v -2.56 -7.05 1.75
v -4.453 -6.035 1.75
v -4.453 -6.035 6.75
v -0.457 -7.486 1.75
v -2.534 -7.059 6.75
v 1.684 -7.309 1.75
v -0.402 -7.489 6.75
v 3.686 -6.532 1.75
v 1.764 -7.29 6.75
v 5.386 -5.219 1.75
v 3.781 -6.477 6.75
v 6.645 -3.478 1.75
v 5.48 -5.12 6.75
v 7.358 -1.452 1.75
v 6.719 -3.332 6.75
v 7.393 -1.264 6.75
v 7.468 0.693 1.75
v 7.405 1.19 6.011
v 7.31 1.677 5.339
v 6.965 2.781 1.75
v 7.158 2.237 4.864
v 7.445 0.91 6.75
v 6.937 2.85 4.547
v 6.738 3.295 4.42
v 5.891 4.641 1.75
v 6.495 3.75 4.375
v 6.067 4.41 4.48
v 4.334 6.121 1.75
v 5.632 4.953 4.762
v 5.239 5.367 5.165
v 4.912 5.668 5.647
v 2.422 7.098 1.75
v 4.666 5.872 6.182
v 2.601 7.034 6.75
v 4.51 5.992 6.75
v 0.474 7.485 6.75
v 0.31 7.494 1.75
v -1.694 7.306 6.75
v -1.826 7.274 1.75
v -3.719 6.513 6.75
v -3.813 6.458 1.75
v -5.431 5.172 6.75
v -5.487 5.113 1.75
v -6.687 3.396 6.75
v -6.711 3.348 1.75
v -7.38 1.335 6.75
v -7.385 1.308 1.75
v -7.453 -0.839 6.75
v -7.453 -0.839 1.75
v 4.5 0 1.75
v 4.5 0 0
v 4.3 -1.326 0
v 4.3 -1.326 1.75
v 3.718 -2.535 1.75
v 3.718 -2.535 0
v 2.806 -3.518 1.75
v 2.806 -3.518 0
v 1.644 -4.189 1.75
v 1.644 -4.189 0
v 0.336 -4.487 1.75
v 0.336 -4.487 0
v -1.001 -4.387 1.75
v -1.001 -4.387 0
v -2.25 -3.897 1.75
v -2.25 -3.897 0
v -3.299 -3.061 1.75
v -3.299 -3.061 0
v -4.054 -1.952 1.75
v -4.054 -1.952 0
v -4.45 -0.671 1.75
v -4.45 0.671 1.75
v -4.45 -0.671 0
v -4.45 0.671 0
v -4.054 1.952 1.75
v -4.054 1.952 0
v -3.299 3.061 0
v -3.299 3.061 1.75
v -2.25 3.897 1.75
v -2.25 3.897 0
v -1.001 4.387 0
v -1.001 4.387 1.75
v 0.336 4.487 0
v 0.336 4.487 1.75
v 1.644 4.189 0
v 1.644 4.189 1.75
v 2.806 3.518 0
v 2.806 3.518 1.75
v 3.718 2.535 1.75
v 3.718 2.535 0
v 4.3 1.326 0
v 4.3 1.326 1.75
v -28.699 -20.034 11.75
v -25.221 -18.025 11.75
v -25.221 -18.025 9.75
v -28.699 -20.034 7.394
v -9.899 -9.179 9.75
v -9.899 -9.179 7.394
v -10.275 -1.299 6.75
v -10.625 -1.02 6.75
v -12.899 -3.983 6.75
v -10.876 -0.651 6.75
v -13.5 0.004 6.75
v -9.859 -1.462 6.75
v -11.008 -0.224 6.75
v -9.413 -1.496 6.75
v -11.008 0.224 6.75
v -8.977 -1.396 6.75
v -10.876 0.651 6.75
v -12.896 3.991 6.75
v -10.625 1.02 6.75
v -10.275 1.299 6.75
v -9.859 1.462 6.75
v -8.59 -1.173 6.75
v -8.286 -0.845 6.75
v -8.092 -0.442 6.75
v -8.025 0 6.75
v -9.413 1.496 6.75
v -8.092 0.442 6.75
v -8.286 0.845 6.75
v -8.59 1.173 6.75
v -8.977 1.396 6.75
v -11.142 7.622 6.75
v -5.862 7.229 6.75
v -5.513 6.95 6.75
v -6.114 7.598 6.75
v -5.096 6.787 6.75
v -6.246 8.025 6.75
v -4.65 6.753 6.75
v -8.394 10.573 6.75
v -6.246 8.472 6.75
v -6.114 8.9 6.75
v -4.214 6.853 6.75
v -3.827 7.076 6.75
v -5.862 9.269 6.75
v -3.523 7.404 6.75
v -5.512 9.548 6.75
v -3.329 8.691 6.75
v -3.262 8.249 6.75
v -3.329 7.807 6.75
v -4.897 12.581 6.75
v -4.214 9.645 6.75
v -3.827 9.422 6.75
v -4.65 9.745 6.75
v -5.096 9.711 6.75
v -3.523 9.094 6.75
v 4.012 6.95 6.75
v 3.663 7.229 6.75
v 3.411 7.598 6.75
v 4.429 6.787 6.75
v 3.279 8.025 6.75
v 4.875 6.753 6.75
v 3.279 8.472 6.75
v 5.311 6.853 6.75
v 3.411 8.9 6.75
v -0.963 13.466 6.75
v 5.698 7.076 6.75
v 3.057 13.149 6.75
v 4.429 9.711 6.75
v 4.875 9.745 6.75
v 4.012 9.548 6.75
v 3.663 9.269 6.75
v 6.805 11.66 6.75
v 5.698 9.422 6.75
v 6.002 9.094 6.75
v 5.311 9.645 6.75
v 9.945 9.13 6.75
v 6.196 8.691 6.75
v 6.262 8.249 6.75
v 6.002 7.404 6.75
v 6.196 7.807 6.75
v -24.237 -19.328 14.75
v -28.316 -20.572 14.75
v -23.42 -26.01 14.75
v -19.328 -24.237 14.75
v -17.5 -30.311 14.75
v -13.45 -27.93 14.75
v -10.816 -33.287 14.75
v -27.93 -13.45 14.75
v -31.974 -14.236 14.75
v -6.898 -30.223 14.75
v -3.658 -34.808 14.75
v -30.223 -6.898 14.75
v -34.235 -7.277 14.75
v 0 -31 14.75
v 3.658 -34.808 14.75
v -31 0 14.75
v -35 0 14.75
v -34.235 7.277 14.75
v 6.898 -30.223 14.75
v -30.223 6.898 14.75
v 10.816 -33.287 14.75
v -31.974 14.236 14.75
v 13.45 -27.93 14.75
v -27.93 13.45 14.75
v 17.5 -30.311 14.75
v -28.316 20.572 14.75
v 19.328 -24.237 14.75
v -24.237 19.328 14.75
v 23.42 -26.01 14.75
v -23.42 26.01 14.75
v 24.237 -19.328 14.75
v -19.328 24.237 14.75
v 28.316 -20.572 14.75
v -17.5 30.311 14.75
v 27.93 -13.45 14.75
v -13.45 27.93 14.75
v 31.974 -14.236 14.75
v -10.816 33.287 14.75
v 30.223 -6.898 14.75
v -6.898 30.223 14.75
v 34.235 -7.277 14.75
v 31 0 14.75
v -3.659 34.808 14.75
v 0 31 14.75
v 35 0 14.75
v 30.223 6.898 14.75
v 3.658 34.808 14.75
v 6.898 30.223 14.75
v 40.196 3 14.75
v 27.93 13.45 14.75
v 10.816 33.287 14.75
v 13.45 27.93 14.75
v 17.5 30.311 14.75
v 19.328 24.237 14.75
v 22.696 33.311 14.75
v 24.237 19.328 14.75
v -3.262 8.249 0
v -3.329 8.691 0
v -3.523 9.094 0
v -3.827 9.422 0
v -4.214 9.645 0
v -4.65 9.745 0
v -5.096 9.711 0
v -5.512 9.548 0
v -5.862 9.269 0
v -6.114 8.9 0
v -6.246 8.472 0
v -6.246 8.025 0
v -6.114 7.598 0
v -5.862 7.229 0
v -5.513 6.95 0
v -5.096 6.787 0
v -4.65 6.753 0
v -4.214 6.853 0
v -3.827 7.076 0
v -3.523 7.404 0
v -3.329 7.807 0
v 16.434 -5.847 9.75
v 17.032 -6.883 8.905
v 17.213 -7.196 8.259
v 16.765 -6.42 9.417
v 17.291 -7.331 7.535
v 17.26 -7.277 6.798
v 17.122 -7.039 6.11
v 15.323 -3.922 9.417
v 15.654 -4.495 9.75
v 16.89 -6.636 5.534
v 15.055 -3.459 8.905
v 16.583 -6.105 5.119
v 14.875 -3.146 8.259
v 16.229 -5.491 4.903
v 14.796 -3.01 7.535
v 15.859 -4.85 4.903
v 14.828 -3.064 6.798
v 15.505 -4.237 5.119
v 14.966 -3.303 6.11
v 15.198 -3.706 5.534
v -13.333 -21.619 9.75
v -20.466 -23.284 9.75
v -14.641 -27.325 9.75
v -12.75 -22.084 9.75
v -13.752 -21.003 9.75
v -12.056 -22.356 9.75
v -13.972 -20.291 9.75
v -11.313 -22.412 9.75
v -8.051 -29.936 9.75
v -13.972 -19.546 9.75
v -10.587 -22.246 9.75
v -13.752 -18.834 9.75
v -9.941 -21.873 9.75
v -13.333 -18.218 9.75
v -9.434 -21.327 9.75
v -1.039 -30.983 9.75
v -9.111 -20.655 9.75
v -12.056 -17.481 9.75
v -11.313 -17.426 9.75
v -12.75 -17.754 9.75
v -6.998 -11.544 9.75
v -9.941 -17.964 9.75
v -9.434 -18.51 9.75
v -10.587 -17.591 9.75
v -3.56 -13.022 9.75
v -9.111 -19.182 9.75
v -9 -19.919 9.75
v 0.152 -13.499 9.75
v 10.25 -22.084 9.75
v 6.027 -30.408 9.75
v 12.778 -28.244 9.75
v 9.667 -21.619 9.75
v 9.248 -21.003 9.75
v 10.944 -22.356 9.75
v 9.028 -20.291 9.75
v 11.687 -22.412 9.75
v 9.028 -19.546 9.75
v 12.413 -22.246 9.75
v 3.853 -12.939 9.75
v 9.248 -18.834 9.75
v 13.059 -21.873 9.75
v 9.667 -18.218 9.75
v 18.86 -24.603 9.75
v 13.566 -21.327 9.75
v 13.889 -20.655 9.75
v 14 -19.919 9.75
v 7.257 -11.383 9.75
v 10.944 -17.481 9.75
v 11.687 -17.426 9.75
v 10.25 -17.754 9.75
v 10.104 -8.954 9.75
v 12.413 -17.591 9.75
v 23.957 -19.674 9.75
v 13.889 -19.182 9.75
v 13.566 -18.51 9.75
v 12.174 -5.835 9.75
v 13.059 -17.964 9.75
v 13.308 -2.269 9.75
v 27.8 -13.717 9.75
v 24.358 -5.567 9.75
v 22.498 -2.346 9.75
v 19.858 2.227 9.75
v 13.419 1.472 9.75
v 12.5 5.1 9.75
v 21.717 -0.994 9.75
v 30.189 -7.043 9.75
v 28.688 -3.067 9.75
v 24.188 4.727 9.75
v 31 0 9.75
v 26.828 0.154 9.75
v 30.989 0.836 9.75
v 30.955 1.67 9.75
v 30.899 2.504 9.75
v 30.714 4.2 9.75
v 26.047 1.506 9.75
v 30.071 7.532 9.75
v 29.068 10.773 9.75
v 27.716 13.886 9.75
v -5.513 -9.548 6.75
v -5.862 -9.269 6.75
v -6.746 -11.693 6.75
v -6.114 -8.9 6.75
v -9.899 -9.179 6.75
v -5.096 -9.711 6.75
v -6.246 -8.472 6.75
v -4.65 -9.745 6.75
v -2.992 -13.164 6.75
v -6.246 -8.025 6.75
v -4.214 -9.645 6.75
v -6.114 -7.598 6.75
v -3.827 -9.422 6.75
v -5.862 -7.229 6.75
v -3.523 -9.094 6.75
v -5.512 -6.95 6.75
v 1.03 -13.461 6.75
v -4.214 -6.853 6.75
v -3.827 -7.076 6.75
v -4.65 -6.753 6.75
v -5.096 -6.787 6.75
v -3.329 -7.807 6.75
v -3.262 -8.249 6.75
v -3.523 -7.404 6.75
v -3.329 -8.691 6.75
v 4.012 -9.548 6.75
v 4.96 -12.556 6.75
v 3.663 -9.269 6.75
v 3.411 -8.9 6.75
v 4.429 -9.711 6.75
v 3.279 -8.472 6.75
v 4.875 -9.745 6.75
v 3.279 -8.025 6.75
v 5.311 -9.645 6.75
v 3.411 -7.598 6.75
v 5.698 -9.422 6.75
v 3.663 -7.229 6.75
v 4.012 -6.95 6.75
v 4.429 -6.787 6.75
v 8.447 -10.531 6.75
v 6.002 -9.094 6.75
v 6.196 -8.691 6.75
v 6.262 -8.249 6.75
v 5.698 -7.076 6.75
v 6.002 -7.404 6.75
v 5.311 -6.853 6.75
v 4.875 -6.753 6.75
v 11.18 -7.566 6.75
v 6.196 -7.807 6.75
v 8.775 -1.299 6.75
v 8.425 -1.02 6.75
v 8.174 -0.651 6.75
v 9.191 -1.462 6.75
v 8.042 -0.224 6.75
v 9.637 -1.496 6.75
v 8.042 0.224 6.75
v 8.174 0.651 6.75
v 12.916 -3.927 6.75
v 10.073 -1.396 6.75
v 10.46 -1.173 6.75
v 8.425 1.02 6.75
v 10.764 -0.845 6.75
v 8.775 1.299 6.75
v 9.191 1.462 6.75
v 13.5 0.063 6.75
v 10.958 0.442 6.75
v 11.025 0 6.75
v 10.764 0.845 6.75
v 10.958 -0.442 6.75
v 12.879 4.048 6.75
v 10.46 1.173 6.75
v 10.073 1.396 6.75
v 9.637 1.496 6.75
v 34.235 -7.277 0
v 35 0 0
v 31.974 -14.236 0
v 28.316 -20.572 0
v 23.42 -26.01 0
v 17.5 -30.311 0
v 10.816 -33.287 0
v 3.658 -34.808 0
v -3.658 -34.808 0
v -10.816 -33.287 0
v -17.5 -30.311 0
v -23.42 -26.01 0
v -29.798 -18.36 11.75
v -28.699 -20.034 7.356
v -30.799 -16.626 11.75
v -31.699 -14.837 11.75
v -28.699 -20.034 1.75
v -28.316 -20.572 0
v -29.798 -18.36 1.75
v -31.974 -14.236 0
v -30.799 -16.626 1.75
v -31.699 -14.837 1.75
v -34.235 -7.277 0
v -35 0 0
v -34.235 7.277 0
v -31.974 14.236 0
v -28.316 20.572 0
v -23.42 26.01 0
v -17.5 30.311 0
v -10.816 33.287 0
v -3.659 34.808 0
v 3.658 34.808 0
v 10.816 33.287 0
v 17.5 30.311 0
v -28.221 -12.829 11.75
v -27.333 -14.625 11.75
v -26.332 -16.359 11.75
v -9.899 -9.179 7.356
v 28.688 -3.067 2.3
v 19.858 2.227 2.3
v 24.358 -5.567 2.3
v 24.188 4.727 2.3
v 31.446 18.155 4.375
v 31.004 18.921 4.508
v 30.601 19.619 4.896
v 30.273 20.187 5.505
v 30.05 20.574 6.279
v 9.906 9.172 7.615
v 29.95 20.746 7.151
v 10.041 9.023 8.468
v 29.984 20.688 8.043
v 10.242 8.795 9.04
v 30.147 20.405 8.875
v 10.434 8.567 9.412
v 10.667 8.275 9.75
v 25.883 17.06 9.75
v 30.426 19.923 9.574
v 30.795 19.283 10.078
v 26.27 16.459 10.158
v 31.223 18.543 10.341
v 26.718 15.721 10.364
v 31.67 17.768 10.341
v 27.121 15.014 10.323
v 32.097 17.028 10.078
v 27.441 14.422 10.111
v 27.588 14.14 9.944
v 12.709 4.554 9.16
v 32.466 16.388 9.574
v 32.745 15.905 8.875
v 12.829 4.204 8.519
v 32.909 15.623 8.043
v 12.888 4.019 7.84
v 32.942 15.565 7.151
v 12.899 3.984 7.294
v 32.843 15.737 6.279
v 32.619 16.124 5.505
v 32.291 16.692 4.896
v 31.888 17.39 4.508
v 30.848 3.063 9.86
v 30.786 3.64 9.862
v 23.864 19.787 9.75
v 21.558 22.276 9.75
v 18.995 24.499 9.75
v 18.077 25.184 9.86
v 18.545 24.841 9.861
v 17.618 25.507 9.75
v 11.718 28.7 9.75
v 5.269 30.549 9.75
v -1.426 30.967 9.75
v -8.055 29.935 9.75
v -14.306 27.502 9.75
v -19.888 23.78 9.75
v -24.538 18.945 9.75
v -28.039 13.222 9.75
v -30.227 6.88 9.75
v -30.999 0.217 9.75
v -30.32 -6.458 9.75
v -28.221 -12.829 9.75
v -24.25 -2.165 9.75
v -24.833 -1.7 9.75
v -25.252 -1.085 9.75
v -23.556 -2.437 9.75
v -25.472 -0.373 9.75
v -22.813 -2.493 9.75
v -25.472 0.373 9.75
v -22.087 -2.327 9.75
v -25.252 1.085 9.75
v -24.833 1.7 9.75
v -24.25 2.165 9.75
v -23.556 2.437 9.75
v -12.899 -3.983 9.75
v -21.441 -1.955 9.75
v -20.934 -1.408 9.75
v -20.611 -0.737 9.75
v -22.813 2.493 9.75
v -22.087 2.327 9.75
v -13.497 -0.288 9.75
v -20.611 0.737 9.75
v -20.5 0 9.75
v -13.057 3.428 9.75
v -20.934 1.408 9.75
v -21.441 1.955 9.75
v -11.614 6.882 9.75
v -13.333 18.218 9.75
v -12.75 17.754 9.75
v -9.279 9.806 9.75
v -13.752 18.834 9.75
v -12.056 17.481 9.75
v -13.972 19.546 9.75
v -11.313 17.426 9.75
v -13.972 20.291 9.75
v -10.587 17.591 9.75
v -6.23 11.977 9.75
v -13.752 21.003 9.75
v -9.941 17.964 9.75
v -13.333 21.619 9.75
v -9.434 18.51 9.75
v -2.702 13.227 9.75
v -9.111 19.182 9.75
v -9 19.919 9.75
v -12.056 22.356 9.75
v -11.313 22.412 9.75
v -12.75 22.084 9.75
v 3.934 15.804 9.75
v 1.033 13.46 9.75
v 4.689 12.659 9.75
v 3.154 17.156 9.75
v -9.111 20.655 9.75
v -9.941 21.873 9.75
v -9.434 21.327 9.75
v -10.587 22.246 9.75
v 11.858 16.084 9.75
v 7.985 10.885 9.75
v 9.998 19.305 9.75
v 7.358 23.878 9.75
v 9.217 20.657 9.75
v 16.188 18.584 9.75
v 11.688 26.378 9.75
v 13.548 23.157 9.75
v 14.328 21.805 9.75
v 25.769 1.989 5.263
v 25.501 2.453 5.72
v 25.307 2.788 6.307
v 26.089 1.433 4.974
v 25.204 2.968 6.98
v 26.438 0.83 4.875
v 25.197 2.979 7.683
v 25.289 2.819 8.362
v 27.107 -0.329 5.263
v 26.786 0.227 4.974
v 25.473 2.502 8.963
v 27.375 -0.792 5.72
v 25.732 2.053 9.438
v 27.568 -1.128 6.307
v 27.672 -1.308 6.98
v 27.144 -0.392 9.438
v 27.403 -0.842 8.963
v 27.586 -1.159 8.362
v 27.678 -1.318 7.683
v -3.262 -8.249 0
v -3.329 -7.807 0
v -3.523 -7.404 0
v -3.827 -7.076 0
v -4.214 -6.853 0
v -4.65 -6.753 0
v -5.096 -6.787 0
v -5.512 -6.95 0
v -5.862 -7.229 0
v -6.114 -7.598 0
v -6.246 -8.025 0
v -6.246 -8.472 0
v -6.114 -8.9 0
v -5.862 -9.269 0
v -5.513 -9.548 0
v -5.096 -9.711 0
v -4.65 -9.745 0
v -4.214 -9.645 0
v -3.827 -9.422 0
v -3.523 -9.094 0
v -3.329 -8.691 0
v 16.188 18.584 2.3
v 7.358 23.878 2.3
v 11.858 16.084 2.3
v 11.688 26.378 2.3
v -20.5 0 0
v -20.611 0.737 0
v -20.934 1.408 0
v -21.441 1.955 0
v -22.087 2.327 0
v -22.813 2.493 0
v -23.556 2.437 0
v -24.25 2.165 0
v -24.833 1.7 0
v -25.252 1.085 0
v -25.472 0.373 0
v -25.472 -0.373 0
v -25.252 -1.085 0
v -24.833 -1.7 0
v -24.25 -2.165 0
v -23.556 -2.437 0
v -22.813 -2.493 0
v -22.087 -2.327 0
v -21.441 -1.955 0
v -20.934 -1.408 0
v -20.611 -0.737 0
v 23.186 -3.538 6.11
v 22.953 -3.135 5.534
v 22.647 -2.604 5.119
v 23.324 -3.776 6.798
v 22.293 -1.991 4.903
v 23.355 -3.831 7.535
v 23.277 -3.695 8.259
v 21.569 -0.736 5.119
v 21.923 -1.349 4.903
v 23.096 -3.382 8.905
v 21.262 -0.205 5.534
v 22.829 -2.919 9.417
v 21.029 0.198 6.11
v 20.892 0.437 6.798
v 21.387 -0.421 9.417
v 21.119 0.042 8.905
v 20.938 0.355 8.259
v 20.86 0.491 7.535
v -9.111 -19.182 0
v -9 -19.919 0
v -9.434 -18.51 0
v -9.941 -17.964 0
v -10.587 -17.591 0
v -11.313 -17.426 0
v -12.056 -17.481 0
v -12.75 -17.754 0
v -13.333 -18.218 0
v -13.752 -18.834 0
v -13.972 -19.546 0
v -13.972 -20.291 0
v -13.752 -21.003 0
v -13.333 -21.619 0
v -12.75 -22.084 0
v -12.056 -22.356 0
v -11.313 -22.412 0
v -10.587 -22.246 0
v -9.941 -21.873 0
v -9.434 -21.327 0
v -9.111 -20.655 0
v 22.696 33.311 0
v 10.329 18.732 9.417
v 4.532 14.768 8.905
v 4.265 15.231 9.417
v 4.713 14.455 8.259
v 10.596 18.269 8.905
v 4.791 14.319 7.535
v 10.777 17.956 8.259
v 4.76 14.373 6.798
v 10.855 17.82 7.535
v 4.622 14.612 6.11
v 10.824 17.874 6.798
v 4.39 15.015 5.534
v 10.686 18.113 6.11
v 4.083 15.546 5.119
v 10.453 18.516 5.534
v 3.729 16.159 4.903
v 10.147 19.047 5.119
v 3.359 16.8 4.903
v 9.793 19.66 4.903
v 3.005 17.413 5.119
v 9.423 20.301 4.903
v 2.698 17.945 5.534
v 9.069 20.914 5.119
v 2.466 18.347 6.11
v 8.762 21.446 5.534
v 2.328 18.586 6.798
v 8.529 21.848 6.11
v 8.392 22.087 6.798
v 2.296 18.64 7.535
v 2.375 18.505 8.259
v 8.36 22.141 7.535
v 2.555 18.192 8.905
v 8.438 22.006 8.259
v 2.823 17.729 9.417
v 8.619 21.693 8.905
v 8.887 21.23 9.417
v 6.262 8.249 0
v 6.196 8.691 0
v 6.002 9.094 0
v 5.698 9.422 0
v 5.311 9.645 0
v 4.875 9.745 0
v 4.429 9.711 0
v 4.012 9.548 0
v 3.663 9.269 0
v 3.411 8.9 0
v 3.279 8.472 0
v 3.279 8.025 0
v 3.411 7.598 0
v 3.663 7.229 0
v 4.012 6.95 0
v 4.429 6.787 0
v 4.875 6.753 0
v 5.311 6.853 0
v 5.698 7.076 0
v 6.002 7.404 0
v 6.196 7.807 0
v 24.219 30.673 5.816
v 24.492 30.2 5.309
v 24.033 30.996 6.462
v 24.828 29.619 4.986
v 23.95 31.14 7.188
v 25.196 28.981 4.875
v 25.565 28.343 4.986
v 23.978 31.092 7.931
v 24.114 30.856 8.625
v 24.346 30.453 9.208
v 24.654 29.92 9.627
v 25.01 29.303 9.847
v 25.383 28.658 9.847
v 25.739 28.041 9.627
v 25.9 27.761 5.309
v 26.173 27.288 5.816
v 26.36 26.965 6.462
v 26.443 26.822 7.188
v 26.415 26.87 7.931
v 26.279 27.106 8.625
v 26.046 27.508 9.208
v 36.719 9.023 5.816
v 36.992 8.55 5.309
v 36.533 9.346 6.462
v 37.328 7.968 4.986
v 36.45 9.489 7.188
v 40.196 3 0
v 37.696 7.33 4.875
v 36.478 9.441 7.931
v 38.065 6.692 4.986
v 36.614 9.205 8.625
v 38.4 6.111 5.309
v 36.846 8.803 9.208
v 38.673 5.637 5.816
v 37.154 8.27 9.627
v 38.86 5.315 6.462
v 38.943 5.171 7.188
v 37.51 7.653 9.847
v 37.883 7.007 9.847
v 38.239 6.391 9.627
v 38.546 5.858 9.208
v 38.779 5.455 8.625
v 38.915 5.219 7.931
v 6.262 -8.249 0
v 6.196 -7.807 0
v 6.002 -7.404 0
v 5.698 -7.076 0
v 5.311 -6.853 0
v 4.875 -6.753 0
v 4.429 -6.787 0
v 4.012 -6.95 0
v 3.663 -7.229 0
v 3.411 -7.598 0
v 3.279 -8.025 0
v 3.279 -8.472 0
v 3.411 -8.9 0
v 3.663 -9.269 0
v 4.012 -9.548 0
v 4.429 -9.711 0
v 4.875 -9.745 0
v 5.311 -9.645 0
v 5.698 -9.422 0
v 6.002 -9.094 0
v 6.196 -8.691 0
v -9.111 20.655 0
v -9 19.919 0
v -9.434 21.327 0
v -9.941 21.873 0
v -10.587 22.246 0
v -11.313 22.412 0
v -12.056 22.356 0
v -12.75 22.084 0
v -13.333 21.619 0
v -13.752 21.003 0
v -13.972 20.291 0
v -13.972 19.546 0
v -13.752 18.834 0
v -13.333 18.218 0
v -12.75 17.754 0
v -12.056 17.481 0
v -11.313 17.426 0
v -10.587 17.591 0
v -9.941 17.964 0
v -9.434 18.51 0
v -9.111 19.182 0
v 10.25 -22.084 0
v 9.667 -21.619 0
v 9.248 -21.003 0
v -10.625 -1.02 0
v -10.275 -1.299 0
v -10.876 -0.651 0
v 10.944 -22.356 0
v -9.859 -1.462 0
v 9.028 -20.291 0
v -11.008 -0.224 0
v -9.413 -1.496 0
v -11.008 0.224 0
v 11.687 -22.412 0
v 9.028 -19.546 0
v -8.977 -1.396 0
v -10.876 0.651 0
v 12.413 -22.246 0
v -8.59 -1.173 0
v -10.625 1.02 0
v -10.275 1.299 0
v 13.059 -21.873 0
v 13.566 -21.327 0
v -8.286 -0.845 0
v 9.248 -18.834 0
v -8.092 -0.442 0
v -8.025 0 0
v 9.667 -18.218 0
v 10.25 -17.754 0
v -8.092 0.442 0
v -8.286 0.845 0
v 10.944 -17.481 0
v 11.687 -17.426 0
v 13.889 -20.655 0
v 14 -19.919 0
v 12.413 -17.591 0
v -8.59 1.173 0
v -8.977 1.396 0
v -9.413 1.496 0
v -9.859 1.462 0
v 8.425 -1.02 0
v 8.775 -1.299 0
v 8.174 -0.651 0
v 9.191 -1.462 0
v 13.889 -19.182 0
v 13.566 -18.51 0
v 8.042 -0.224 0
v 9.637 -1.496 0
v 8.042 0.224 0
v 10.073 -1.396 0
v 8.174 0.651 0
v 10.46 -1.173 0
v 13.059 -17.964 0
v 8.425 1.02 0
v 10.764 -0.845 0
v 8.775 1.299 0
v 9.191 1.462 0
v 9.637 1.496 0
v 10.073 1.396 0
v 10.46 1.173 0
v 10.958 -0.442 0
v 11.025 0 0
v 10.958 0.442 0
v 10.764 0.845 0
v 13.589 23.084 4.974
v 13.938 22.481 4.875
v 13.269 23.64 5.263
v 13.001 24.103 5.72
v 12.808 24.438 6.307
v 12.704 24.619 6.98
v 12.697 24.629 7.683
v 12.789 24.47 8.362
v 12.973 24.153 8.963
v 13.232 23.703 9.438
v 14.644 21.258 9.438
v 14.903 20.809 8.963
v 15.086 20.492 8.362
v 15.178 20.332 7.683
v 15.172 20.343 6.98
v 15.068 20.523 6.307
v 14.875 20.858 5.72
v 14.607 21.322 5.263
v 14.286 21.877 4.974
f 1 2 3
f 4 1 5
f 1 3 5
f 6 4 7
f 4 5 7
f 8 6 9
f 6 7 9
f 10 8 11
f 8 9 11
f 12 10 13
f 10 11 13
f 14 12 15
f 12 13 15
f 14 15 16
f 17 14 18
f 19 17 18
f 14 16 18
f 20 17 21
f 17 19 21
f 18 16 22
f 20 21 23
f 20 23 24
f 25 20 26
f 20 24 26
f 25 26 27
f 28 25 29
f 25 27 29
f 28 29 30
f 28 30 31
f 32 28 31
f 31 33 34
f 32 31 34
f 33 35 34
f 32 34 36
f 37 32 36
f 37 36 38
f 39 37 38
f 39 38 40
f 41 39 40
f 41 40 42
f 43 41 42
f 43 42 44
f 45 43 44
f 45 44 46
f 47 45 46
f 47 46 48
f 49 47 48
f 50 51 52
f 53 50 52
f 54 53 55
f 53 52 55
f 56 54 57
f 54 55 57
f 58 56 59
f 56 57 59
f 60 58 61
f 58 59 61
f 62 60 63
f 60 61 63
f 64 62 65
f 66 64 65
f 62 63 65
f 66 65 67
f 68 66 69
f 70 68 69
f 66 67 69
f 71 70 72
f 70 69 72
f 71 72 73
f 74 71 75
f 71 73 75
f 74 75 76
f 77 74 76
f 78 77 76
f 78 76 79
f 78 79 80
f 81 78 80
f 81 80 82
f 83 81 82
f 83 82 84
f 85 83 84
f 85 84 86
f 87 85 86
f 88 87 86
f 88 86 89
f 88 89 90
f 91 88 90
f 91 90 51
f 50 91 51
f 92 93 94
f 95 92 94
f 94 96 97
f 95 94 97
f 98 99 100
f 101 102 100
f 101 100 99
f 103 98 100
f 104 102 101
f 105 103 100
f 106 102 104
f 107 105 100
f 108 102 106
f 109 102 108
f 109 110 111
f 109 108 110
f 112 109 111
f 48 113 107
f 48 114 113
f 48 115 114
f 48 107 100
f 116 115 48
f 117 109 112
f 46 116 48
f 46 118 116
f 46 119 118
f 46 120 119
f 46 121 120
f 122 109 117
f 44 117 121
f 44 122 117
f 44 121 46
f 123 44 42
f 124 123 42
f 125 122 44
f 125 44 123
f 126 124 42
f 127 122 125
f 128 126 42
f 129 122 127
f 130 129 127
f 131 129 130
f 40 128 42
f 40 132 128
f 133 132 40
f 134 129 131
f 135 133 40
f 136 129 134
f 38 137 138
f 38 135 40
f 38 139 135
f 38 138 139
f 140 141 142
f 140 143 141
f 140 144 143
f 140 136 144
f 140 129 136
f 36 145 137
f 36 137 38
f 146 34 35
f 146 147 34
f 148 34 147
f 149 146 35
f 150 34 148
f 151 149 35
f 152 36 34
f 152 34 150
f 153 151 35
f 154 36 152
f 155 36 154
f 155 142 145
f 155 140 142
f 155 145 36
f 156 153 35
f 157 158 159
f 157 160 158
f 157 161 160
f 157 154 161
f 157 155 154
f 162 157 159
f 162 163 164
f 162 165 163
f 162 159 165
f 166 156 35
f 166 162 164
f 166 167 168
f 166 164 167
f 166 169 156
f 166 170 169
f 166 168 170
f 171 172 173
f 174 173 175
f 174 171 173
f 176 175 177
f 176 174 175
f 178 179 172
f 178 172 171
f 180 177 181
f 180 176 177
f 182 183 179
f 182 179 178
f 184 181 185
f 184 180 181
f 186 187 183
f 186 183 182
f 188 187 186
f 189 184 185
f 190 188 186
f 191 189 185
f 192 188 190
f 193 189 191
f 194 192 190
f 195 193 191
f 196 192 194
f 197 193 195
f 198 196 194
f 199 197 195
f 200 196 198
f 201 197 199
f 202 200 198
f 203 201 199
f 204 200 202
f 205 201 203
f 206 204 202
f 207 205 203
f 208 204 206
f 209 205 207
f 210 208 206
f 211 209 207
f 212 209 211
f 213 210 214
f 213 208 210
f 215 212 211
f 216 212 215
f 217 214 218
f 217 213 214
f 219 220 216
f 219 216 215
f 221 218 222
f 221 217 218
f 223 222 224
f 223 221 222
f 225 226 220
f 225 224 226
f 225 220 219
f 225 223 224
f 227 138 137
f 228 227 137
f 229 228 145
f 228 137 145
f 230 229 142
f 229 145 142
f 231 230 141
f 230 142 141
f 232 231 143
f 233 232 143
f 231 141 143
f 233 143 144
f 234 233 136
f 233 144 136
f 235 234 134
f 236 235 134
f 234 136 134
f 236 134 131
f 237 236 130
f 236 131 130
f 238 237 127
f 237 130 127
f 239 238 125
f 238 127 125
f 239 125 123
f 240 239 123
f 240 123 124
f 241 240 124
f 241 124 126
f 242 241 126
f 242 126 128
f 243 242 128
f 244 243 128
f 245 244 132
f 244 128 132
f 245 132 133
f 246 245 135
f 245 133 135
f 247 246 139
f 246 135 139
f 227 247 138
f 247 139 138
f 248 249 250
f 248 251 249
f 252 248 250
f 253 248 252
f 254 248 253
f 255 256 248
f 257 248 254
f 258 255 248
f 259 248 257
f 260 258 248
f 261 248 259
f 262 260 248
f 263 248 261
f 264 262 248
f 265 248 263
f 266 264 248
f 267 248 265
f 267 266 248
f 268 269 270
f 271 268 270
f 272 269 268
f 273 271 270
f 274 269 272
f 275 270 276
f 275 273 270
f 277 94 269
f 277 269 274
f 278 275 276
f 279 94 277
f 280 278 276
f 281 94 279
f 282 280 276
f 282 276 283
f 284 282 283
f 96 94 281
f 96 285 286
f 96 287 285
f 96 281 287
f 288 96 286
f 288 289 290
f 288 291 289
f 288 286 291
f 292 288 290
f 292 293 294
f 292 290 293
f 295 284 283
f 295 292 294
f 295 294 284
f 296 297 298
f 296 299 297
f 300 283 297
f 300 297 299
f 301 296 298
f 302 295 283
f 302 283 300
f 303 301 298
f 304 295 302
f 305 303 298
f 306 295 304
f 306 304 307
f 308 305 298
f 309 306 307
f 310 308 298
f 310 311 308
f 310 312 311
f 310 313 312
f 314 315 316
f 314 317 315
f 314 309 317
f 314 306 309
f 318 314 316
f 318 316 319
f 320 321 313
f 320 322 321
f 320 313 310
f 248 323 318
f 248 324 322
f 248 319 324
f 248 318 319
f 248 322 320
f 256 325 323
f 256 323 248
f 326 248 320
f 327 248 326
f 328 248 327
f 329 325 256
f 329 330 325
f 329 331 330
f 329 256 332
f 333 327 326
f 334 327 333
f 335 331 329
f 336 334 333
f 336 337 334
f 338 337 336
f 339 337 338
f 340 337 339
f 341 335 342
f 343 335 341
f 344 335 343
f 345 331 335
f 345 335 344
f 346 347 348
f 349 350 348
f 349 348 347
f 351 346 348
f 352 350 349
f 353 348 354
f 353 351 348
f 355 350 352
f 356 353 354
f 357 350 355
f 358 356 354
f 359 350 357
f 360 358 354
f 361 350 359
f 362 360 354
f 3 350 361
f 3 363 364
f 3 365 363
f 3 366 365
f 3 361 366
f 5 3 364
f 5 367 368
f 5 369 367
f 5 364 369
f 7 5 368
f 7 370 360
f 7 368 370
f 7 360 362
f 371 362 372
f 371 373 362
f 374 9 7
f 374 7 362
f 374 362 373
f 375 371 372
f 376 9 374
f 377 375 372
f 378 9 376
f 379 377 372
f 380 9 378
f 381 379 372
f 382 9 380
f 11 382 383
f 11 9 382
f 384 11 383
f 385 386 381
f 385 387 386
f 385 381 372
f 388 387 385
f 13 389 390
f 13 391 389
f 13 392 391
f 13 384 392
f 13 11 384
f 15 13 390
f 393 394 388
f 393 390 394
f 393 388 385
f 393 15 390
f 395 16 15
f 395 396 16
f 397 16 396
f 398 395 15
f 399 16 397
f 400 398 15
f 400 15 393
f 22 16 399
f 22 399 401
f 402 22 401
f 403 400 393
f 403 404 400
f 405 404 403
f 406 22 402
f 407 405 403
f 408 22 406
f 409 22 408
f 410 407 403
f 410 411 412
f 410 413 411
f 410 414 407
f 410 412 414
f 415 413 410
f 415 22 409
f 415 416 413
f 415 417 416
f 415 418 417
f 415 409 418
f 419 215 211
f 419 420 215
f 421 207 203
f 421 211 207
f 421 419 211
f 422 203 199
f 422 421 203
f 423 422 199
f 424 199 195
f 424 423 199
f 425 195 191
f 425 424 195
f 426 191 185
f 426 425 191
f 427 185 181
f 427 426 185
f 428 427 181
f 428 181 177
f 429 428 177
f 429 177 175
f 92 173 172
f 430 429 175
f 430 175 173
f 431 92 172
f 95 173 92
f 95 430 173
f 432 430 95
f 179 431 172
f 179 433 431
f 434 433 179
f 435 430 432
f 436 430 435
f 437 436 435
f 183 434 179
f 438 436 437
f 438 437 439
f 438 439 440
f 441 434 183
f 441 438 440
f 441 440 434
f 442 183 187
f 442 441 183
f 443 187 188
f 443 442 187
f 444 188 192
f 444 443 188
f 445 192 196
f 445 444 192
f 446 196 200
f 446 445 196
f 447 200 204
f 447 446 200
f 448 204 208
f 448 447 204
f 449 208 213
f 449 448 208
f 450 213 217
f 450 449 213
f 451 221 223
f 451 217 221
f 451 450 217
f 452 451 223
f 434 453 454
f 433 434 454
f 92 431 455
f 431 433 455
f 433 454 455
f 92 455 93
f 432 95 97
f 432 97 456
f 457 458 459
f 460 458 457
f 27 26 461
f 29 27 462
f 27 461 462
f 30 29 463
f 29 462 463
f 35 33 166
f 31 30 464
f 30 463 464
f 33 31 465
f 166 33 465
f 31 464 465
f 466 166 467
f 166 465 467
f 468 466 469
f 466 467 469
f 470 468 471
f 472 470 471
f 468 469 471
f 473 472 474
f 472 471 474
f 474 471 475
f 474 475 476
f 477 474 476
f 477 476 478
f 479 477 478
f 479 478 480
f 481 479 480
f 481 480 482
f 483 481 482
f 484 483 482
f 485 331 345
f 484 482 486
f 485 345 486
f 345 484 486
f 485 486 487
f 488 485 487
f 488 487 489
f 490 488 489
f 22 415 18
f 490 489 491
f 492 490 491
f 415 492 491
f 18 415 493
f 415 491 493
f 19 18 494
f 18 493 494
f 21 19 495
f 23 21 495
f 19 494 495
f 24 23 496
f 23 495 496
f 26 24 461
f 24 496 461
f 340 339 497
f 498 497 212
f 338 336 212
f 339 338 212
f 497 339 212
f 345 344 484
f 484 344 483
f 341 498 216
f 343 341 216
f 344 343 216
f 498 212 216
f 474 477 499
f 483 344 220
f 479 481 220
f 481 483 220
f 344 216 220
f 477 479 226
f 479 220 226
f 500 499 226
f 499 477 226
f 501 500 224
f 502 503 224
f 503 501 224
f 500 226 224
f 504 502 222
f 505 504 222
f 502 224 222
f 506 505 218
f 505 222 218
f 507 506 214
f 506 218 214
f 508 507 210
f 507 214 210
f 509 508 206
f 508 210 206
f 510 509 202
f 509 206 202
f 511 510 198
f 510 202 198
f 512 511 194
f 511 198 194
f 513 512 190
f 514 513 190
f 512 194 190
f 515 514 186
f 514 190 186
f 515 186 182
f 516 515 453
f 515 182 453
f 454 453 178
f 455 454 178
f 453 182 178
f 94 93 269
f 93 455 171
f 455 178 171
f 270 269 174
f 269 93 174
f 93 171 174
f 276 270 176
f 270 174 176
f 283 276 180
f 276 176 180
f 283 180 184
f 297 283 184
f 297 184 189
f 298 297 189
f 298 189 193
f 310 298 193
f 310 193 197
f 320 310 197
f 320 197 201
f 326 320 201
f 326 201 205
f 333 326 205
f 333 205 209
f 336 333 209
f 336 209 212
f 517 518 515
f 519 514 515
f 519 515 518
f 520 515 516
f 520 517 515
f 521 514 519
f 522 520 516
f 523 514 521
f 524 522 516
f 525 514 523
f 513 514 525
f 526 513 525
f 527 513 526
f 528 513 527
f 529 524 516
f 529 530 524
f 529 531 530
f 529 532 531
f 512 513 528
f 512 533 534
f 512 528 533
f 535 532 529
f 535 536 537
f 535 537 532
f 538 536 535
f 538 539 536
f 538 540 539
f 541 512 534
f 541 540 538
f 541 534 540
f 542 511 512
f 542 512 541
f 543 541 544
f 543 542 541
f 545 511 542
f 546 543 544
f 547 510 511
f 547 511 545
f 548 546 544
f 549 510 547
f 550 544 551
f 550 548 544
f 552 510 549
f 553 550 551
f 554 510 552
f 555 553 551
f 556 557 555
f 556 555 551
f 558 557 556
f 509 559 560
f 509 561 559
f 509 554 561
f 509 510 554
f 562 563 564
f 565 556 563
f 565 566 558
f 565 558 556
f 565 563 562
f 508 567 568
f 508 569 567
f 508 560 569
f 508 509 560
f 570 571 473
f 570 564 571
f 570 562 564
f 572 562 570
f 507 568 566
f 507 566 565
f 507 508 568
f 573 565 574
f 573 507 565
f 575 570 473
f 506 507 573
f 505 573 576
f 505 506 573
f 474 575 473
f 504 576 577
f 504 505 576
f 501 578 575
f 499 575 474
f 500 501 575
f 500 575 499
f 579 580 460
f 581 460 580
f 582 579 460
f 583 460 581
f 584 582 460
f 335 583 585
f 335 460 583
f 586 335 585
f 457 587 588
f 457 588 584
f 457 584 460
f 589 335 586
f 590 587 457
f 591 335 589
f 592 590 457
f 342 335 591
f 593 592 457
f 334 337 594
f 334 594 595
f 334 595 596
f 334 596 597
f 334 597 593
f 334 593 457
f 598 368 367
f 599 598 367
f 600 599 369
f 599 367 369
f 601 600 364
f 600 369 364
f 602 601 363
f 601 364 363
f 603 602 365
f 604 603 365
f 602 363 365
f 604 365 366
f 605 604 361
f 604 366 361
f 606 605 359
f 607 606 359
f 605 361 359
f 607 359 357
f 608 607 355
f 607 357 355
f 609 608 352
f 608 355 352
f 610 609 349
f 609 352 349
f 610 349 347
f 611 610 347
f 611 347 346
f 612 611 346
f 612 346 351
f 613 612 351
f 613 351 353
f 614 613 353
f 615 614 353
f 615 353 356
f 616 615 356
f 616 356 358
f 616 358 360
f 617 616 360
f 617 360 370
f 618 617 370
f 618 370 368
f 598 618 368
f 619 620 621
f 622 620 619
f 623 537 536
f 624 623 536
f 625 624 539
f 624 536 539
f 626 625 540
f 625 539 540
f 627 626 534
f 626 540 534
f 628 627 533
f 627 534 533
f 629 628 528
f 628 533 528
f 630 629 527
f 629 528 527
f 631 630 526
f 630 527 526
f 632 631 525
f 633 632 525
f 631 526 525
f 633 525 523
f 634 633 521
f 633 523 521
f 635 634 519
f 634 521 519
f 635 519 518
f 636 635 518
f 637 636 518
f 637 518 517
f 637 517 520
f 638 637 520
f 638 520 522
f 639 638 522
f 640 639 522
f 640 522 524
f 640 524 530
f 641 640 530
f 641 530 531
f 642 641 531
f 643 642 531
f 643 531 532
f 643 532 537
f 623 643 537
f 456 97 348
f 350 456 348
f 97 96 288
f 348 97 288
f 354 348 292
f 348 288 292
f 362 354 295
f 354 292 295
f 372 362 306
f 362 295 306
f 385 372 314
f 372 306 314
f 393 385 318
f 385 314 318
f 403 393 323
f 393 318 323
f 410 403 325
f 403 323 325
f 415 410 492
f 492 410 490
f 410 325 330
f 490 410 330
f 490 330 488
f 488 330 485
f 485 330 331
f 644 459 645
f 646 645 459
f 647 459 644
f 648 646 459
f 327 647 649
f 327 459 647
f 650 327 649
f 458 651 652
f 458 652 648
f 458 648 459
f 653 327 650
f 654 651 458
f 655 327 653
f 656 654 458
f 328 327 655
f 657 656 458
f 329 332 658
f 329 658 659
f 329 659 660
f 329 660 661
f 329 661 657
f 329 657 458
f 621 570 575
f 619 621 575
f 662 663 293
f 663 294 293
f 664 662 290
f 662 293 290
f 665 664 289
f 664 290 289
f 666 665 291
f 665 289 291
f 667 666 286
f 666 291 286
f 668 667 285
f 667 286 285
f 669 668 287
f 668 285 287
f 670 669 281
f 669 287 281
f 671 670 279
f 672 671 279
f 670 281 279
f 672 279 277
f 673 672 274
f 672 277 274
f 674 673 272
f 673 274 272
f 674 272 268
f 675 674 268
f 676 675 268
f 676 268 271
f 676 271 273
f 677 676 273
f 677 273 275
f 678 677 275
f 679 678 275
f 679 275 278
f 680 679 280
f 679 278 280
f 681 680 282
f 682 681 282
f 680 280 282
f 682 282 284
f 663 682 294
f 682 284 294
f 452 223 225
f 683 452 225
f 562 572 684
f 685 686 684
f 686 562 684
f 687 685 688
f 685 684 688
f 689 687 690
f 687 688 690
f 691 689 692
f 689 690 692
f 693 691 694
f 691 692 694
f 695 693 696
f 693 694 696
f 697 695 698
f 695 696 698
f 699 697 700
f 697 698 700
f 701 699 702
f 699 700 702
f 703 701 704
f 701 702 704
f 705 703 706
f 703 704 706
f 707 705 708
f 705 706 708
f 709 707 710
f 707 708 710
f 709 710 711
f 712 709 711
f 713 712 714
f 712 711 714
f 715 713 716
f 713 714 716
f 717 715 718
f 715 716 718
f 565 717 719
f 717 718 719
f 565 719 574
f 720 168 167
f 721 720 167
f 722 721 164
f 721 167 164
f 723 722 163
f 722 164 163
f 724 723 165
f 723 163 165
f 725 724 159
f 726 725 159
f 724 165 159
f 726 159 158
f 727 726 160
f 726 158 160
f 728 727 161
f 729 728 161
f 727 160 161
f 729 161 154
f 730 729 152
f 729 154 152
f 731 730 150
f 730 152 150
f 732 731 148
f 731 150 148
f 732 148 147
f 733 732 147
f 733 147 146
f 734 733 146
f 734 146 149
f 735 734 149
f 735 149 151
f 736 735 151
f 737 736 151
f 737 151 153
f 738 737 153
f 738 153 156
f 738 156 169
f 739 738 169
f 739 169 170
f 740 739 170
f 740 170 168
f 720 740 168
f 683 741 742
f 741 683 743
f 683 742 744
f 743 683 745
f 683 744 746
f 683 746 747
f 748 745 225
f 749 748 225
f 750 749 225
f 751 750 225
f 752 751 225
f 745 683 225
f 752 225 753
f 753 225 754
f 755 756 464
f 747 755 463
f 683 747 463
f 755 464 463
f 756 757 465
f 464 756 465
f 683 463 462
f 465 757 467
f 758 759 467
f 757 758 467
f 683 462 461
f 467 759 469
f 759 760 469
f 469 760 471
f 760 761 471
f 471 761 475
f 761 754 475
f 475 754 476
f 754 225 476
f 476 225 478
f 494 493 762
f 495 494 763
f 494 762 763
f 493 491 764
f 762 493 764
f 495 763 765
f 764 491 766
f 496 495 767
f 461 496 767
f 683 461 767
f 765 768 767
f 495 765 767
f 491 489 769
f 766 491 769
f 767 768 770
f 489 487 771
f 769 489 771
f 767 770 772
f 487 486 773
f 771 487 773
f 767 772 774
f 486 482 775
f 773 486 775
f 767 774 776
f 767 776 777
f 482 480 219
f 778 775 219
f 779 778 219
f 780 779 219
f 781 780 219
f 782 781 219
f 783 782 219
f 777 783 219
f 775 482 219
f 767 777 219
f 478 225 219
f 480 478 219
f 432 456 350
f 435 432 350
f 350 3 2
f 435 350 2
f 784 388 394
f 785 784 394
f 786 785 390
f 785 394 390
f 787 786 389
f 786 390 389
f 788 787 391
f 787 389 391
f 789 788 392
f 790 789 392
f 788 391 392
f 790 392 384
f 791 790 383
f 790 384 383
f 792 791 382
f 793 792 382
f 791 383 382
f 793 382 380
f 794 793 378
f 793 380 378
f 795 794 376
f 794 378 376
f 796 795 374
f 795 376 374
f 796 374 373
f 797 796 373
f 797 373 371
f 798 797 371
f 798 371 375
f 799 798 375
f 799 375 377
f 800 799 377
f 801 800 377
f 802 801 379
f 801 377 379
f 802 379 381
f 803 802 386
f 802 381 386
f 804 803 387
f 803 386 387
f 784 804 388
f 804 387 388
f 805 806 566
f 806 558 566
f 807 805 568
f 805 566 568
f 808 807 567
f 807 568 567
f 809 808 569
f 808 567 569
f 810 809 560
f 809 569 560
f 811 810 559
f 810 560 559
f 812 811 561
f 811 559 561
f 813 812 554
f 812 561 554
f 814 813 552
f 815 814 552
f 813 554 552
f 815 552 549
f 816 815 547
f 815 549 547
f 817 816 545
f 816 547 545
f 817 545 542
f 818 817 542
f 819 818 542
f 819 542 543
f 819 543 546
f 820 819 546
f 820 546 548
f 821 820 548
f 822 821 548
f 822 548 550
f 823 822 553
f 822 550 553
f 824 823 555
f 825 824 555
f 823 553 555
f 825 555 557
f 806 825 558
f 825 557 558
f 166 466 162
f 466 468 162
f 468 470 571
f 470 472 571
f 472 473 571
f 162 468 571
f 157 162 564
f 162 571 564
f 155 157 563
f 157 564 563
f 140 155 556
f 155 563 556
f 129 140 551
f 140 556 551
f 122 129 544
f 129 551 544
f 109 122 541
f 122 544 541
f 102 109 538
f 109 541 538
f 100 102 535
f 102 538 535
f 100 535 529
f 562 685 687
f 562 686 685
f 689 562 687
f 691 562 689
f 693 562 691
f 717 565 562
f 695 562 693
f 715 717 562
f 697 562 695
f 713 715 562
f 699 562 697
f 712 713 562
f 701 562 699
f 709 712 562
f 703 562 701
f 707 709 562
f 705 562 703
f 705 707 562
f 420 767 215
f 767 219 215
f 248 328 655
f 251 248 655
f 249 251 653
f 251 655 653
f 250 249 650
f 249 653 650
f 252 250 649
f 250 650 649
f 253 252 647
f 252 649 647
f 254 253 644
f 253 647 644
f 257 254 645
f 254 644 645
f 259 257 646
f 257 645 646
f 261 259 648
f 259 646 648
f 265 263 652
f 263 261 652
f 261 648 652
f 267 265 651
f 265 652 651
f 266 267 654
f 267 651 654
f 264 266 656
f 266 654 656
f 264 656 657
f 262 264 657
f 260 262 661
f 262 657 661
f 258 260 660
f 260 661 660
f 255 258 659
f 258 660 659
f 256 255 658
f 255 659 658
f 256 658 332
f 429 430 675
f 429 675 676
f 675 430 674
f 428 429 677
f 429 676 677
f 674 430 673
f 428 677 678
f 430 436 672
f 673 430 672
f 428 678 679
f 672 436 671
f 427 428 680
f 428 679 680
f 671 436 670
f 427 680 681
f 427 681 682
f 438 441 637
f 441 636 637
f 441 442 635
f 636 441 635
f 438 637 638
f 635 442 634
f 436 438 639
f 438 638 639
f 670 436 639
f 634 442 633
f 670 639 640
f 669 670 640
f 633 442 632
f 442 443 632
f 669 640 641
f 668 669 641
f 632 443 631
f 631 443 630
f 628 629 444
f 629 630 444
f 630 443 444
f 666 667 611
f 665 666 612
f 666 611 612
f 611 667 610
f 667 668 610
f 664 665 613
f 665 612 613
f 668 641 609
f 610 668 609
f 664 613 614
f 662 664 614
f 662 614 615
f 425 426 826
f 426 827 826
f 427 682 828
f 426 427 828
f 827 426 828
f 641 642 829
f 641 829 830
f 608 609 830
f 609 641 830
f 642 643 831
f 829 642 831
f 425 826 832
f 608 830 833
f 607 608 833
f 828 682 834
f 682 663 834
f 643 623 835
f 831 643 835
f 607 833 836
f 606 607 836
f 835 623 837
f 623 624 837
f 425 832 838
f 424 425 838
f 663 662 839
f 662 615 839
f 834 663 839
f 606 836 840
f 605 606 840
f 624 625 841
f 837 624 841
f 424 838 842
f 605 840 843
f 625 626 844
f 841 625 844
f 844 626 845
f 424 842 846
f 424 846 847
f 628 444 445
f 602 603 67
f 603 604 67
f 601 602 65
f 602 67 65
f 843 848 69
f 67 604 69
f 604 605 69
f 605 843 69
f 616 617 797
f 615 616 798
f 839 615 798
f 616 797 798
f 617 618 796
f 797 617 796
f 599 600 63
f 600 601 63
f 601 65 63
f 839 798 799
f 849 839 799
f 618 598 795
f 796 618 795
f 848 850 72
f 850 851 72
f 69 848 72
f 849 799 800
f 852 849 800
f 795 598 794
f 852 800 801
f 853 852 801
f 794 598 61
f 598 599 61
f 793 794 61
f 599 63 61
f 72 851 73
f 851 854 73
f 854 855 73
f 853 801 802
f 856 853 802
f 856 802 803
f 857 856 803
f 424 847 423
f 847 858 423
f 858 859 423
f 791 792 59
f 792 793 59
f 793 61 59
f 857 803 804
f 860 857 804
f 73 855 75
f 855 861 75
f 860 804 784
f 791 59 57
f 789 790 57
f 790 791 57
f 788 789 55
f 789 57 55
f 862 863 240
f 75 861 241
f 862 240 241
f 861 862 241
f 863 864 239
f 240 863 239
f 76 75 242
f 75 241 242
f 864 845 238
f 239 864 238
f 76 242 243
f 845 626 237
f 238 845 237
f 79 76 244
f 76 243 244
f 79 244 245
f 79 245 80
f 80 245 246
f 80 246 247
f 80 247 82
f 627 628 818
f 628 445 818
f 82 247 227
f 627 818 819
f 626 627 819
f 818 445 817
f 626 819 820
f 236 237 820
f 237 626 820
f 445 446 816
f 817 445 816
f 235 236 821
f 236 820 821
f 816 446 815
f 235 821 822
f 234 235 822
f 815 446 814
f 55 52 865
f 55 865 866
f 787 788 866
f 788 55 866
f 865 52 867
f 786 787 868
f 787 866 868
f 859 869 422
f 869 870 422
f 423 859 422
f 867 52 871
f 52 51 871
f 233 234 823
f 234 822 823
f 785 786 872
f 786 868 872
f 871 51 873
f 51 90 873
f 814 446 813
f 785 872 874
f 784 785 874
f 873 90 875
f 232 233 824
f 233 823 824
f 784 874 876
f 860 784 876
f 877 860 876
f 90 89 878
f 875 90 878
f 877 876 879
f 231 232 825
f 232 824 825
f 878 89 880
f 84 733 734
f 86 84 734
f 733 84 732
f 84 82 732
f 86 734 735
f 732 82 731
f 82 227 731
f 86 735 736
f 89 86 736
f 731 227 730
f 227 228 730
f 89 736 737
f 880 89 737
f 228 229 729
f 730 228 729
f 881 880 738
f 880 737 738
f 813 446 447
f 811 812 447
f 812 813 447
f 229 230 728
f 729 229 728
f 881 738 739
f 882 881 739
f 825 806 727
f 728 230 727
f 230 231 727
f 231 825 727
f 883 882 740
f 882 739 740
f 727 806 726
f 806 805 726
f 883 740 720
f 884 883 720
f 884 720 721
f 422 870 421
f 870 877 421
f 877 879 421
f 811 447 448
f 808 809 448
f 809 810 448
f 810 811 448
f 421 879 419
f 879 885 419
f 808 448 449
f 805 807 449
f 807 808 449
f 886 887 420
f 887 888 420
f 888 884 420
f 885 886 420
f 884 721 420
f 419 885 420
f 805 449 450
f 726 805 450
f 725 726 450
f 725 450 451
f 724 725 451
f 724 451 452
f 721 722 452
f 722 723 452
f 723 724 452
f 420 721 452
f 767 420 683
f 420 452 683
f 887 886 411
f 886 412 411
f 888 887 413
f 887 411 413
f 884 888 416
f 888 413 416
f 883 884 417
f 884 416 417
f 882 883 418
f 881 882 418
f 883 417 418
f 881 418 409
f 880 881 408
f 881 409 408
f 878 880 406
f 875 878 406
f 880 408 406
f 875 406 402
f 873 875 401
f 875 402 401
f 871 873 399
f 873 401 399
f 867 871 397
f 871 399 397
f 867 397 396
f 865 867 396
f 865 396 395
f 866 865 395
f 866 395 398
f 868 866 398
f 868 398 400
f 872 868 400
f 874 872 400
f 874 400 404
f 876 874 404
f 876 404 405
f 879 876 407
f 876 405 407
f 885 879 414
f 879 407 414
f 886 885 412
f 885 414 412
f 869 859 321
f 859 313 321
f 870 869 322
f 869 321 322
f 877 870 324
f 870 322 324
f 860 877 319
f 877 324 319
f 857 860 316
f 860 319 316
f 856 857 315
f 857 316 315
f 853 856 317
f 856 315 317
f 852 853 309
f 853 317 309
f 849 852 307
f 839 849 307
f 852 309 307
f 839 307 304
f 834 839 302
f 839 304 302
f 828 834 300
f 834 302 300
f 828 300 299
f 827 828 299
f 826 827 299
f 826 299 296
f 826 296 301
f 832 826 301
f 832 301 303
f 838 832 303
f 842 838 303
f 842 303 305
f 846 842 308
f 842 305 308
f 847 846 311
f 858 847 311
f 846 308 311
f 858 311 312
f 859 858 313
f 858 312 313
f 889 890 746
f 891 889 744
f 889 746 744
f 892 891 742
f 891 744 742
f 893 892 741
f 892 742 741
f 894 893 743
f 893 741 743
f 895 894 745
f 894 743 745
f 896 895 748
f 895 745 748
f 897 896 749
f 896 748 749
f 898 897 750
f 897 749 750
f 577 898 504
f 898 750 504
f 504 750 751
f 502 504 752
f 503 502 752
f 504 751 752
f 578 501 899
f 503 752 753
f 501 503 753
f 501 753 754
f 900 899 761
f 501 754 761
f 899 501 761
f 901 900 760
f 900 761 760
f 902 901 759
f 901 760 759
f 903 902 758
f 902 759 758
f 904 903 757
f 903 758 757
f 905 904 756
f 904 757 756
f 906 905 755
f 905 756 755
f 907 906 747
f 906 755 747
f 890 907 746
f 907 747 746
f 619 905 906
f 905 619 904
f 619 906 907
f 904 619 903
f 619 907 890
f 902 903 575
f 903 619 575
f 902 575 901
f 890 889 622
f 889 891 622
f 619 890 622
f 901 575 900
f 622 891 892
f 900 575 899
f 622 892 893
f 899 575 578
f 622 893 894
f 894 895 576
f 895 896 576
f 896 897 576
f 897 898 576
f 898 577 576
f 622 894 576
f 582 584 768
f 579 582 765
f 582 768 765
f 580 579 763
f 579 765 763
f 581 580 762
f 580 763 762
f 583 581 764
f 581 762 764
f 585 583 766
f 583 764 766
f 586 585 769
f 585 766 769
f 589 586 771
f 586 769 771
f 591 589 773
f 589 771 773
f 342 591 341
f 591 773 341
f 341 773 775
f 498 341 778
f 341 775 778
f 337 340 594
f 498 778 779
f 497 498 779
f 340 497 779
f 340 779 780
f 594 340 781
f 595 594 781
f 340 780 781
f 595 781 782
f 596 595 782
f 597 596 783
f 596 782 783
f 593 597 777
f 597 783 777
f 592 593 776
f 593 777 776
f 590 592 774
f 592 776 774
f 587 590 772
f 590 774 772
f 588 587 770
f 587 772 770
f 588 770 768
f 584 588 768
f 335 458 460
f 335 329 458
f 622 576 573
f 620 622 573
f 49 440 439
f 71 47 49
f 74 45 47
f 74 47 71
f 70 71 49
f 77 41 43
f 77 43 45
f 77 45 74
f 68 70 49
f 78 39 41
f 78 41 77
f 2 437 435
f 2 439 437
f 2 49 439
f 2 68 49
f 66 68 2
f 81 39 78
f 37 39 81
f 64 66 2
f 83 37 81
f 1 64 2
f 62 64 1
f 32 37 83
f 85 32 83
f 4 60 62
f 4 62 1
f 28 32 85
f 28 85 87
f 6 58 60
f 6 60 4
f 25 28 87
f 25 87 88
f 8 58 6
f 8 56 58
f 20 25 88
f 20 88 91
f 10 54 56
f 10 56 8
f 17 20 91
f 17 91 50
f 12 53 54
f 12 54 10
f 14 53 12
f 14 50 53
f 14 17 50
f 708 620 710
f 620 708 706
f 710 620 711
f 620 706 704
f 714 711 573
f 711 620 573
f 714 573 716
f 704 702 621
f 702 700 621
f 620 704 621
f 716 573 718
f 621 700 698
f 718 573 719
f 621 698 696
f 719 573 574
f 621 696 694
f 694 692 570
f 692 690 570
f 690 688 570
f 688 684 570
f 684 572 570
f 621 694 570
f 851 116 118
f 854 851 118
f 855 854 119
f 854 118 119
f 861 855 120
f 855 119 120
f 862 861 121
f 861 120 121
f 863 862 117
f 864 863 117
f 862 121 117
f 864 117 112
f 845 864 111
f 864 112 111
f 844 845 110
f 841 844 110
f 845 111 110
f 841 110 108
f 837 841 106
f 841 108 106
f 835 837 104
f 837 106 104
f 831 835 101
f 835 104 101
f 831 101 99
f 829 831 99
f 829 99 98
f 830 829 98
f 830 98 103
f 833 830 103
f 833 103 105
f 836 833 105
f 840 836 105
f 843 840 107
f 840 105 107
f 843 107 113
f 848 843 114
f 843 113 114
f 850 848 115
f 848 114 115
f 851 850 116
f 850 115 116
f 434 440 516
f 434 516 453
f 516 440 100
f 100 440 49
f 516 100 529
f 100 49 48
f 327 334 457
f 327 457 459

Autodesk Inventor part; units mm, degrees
ref_plane "YZ Plane" through (0, 0, 0) normal (1, 0, 0) x (0, 1, 0)
ref_plane "XZ Plane" through (0, 0, 0) normal (0, 1, 0) x (-1, 0, 0)
sketch "Sketch1" plane through (0, 0, 0) normal (0, 0, 1) x (1, 0, 0)
  circle A0 centre (0, 0) radius 35
  circle A1 centre (0, 0) radius 4.5
  dimension "d0" = 70
  dimension "d1" = 9
extrude "Extrusion1" add sketch "Sketch1" along normal blind 14.75
sketch "Sketch2" plane through (0, 0, 14.75) normal (0, 0, 1) x (1, 0, 0)
  circle A0 centre (0, 0) radius 13.5
  dimension "d4" = 27
extrude "Extrusion2" cut sketch "Sketch2" against normal blind 8
sketch "Sketch3" plane through (0, 0, 6.75) normal (0, 0, 1) x (1, 0, 0)
  circle A0 centre (0, 0) radius 7.5
  dimension "d7" = 15
extrude "Extrusion3" cut sketch "Sketch3" against normal blind 5
sketch "Sketch4" plane through (0, 0, 6.75) normal (0, 0, 1) x (1, 0, 0)
  circle A0 centre (9.525, 0) radius 1.5
  circle A1 centre (4.7625, 8.2489) radius 1.5
  circle A2 centre (-4.7625, 8.2489) radius 1.5
  circle A3 centre (-9.525, 0) radius 1.5
  circle A4 centre (-4.7625, -8.2489) radius 1.5
  circle A5 centre (4.7625, -8.2489) radius 1.5
  point P0 (0, 0)
  dimension "d10" = 3
  dimension "d11" = 9.525
  dimension "d14" = 360
extrude "Extrusion4" cut sketch "Sketch4" against normal through all
sketch "Sketch5" plane through (0, 0, 14.75) normal (0, 0, 1) x (1, 0, 0)
  circle A0 centre (23, 0) radius 2.5
  circle A1 centre (11.5, 19.9186) radius 2.5
  circle A2 centre (-11.5, 19.9186) radius 2.5
  circle A3 centre (-23, 0) radius 2.5
  circle A4 centre (-11.5, -19.9186) radius 2.5
  circle A5 centre (11.5, -19.9186) radius 2.5
  point P0 (0, 0)
  dimension "d18" = 5
  dimension "d19" = 23
  dimension "d22" = 360
extrude "Extrusion5" cut sketch "Sketch5" against normal through all contours A2 | A3 | A4 | A5
sketch "Sketch7" plane through (0, 0, 14.75) normal (0, 0, 1) x (1, 0, 0)
  line L0 (17.5, 30.3109) -> (22.6962, 33.3109)
  line L1 (22.6962, 33.3109) -> (40.1962, 3)
  line L2 (40.1962, 3) -> (35, 0)
  line L3 (35, 0) -> (17.5, 30.3109)
  circle A0 centre (0, 0) radius 35 construction
  line L4 (0, 0) -> (26.25, 15.1554)
  line L5 (0, 0) -> (26.25, 0)
  dimension "d33" = 6
  dimension "d34" = 35
  dimension "d43" = 30
extrude "Extrusion7" add sketch "Sketch7" against normal blind 14.75
sketch "Sketch8" plane through (40.1962, 3, 14.75) normal (0.866, 0.5, 0) x (0, 0, -1)
  circle A0 centre (7.375, 30) radius 2.5
  circle A1 centre (7.375, 5) radius 2.5
  line L0 (7.375, 30) -> (7.375, 5) construction
  line L1 (14.75, 35) -> (14.75, 0) projected
  line L2 (0, 35) -> (14.75, 35) projected
  point P0 (14.75, 17.5)
  point P1 (14.75, 17.5)
  point P2 (7.375, 17.5)
  point P3 (7.375, 35)
  dimension "d37" = 5
  dimension "d38" = 5
  dimension "d39" = 25
extrude "Extrusion8" cut sketch "Sketch8" against normal blind 25
sketch "Sketch9" plane through (40.1962, 3, 14.75) normal (0.866, 0.5, 0) x (0, 0, -1)
  circle A0 centre (7.375, 17.5) radius 3
  line L0 (14.75, 35) -> (14.75, 0) projected
  circle A1 centre (7.375, 30) radius 2.5 construction
  point P0 (14.75, 17.5)
  point P1 (14.75, 17.5)
  dimension "d42" = 6
extrude "Extrusion9" cut sketch "Sketch9" against normal through all
ref_plane "Work Plane1" through (8.75, -15.1554, 14.75) normal (0.866, 0.5, 0) x (0, 0, -1)
sketch "Sketch11" plane through (8.75, -15.1554, 14.75) normal (0.866, 0.5, 0) x (0, 0, -1)
  line L0 (13, 22) -> (13, 13) projected
  line L1 (13, 10) -> (13, 25) projected
  line L2 (0, 35) -> (0, 0) projected
  line L3 (0, 35) -> (0, 0) projected
  line L4 (0, 4) -> (0, 31) projected
  line L5 (13, 10) -> (13, 25) projected
  line L6 (13, 20.5) -> (3, 20.5)
  line L7 (3, 20.5) -> (3, 14.5)
  line L8 (3, 14.5) -> (13, 14.5)
  line L9 (13, 14.5) -> (13, 20.5)
  point P0 (14.75, 17.5)
  point P1 (0, -0.5)
  point P2 (0, 12.5)
  point P3 (0, 34)
  point P4 (0, 47)
  point P5 (0, -0.5)
  point P6 (0, 12.5)
  point P7 (0, 22.5)
  point P8 (0, 35.5)
  point P9 (0, 22.5)
  point P10 (0, 35.5)
  point P11 (0, -12)
  point P12 (0, 1)
  point P13 (8, 20.4342)
  point P14 (8, 14.5658)
  dimension "d47" = 3
extrude "Extrusion10" cut sketch "Sketch11" against normal through all
sketch "Sketch12" plane through (0, 0, 14.75) normal (0, 0, 1) x (1, 0, 0)
  arc A0 (17.5, 30.3109) -> (35, 0) centre (0, 0) ccw projected
  circle A1 centre (0, 0) radius 35
  circle A2 centre (0, 0) radius 31
  dimension "d50" = 4
extrude "Extrusion11" cut sketch "Sketch12" against normal blind 5 contours A2
sketch "Sketch13" plane through (0, 0, 9.75) normal (0, 0, 1) x (1, 0, 0)
  line L0 (7.3577, 23.8779) -> (11.8577, 16.0836)
  line L1 (11.8577, 16.0836) -> (16.1878, 18.5836)
  line L2 (16.1878, 18.5836) -> (11.6878, 26.3779)
  line L3 (11.6878, 26.3779) -> (7.3577, 23.8779)
  line L4 (3.1552, 17.1568) -> (3.9358, 15.8047)
  line L5 (17.6181, 25.5069) -> (3.1552, 17.1568)
  line L6 (3.5455, 16.4808) -> (9.6077, 19.9808)
  circle A0 centre (0, 0) radius 4.5
  line L7 (0, 0) -> (38.9378, 22.4808)
  line L8 (0, 0) -> (44.9615, 0) construction
  line L9 (24.3577, -5.567) -> (19.8577, 2.2272)
  line L10 (19.8577, 2.2272) -> (24.1878, 4.7272)
  line L11 (24.1878, 4.7272) -> (28.6878, -3.067)
  line L12 (28.6878, -3.067) -> (24.3577, -5.567)
  line L13 (16.4358, -5.8459) -> (15.6552, -4.4938)
  line L14 (30.8987, 2.5042) -> (16.4358, -5.8459)
  line L15 (16.0455, -5.1699) -> (22.1077, -1.6699)
  point P0 (30.8987, 2.5042)
  point P1 (22.1077, -1.6699)
  dimension "d54" = 5
  dimension "d56" = 9
  dimension "d59" = 7
  dimension "d60" = 30
extrude "Extrusion12" cut sketch "Sketch13" against normal blind 7.45 contours L0 L5 L2 L1 | L0 L3 L2 L5 | L9 L10 L11 L14 | L14 L11 L12 L9
properties part number "AA046" material "ABS Plastic"
